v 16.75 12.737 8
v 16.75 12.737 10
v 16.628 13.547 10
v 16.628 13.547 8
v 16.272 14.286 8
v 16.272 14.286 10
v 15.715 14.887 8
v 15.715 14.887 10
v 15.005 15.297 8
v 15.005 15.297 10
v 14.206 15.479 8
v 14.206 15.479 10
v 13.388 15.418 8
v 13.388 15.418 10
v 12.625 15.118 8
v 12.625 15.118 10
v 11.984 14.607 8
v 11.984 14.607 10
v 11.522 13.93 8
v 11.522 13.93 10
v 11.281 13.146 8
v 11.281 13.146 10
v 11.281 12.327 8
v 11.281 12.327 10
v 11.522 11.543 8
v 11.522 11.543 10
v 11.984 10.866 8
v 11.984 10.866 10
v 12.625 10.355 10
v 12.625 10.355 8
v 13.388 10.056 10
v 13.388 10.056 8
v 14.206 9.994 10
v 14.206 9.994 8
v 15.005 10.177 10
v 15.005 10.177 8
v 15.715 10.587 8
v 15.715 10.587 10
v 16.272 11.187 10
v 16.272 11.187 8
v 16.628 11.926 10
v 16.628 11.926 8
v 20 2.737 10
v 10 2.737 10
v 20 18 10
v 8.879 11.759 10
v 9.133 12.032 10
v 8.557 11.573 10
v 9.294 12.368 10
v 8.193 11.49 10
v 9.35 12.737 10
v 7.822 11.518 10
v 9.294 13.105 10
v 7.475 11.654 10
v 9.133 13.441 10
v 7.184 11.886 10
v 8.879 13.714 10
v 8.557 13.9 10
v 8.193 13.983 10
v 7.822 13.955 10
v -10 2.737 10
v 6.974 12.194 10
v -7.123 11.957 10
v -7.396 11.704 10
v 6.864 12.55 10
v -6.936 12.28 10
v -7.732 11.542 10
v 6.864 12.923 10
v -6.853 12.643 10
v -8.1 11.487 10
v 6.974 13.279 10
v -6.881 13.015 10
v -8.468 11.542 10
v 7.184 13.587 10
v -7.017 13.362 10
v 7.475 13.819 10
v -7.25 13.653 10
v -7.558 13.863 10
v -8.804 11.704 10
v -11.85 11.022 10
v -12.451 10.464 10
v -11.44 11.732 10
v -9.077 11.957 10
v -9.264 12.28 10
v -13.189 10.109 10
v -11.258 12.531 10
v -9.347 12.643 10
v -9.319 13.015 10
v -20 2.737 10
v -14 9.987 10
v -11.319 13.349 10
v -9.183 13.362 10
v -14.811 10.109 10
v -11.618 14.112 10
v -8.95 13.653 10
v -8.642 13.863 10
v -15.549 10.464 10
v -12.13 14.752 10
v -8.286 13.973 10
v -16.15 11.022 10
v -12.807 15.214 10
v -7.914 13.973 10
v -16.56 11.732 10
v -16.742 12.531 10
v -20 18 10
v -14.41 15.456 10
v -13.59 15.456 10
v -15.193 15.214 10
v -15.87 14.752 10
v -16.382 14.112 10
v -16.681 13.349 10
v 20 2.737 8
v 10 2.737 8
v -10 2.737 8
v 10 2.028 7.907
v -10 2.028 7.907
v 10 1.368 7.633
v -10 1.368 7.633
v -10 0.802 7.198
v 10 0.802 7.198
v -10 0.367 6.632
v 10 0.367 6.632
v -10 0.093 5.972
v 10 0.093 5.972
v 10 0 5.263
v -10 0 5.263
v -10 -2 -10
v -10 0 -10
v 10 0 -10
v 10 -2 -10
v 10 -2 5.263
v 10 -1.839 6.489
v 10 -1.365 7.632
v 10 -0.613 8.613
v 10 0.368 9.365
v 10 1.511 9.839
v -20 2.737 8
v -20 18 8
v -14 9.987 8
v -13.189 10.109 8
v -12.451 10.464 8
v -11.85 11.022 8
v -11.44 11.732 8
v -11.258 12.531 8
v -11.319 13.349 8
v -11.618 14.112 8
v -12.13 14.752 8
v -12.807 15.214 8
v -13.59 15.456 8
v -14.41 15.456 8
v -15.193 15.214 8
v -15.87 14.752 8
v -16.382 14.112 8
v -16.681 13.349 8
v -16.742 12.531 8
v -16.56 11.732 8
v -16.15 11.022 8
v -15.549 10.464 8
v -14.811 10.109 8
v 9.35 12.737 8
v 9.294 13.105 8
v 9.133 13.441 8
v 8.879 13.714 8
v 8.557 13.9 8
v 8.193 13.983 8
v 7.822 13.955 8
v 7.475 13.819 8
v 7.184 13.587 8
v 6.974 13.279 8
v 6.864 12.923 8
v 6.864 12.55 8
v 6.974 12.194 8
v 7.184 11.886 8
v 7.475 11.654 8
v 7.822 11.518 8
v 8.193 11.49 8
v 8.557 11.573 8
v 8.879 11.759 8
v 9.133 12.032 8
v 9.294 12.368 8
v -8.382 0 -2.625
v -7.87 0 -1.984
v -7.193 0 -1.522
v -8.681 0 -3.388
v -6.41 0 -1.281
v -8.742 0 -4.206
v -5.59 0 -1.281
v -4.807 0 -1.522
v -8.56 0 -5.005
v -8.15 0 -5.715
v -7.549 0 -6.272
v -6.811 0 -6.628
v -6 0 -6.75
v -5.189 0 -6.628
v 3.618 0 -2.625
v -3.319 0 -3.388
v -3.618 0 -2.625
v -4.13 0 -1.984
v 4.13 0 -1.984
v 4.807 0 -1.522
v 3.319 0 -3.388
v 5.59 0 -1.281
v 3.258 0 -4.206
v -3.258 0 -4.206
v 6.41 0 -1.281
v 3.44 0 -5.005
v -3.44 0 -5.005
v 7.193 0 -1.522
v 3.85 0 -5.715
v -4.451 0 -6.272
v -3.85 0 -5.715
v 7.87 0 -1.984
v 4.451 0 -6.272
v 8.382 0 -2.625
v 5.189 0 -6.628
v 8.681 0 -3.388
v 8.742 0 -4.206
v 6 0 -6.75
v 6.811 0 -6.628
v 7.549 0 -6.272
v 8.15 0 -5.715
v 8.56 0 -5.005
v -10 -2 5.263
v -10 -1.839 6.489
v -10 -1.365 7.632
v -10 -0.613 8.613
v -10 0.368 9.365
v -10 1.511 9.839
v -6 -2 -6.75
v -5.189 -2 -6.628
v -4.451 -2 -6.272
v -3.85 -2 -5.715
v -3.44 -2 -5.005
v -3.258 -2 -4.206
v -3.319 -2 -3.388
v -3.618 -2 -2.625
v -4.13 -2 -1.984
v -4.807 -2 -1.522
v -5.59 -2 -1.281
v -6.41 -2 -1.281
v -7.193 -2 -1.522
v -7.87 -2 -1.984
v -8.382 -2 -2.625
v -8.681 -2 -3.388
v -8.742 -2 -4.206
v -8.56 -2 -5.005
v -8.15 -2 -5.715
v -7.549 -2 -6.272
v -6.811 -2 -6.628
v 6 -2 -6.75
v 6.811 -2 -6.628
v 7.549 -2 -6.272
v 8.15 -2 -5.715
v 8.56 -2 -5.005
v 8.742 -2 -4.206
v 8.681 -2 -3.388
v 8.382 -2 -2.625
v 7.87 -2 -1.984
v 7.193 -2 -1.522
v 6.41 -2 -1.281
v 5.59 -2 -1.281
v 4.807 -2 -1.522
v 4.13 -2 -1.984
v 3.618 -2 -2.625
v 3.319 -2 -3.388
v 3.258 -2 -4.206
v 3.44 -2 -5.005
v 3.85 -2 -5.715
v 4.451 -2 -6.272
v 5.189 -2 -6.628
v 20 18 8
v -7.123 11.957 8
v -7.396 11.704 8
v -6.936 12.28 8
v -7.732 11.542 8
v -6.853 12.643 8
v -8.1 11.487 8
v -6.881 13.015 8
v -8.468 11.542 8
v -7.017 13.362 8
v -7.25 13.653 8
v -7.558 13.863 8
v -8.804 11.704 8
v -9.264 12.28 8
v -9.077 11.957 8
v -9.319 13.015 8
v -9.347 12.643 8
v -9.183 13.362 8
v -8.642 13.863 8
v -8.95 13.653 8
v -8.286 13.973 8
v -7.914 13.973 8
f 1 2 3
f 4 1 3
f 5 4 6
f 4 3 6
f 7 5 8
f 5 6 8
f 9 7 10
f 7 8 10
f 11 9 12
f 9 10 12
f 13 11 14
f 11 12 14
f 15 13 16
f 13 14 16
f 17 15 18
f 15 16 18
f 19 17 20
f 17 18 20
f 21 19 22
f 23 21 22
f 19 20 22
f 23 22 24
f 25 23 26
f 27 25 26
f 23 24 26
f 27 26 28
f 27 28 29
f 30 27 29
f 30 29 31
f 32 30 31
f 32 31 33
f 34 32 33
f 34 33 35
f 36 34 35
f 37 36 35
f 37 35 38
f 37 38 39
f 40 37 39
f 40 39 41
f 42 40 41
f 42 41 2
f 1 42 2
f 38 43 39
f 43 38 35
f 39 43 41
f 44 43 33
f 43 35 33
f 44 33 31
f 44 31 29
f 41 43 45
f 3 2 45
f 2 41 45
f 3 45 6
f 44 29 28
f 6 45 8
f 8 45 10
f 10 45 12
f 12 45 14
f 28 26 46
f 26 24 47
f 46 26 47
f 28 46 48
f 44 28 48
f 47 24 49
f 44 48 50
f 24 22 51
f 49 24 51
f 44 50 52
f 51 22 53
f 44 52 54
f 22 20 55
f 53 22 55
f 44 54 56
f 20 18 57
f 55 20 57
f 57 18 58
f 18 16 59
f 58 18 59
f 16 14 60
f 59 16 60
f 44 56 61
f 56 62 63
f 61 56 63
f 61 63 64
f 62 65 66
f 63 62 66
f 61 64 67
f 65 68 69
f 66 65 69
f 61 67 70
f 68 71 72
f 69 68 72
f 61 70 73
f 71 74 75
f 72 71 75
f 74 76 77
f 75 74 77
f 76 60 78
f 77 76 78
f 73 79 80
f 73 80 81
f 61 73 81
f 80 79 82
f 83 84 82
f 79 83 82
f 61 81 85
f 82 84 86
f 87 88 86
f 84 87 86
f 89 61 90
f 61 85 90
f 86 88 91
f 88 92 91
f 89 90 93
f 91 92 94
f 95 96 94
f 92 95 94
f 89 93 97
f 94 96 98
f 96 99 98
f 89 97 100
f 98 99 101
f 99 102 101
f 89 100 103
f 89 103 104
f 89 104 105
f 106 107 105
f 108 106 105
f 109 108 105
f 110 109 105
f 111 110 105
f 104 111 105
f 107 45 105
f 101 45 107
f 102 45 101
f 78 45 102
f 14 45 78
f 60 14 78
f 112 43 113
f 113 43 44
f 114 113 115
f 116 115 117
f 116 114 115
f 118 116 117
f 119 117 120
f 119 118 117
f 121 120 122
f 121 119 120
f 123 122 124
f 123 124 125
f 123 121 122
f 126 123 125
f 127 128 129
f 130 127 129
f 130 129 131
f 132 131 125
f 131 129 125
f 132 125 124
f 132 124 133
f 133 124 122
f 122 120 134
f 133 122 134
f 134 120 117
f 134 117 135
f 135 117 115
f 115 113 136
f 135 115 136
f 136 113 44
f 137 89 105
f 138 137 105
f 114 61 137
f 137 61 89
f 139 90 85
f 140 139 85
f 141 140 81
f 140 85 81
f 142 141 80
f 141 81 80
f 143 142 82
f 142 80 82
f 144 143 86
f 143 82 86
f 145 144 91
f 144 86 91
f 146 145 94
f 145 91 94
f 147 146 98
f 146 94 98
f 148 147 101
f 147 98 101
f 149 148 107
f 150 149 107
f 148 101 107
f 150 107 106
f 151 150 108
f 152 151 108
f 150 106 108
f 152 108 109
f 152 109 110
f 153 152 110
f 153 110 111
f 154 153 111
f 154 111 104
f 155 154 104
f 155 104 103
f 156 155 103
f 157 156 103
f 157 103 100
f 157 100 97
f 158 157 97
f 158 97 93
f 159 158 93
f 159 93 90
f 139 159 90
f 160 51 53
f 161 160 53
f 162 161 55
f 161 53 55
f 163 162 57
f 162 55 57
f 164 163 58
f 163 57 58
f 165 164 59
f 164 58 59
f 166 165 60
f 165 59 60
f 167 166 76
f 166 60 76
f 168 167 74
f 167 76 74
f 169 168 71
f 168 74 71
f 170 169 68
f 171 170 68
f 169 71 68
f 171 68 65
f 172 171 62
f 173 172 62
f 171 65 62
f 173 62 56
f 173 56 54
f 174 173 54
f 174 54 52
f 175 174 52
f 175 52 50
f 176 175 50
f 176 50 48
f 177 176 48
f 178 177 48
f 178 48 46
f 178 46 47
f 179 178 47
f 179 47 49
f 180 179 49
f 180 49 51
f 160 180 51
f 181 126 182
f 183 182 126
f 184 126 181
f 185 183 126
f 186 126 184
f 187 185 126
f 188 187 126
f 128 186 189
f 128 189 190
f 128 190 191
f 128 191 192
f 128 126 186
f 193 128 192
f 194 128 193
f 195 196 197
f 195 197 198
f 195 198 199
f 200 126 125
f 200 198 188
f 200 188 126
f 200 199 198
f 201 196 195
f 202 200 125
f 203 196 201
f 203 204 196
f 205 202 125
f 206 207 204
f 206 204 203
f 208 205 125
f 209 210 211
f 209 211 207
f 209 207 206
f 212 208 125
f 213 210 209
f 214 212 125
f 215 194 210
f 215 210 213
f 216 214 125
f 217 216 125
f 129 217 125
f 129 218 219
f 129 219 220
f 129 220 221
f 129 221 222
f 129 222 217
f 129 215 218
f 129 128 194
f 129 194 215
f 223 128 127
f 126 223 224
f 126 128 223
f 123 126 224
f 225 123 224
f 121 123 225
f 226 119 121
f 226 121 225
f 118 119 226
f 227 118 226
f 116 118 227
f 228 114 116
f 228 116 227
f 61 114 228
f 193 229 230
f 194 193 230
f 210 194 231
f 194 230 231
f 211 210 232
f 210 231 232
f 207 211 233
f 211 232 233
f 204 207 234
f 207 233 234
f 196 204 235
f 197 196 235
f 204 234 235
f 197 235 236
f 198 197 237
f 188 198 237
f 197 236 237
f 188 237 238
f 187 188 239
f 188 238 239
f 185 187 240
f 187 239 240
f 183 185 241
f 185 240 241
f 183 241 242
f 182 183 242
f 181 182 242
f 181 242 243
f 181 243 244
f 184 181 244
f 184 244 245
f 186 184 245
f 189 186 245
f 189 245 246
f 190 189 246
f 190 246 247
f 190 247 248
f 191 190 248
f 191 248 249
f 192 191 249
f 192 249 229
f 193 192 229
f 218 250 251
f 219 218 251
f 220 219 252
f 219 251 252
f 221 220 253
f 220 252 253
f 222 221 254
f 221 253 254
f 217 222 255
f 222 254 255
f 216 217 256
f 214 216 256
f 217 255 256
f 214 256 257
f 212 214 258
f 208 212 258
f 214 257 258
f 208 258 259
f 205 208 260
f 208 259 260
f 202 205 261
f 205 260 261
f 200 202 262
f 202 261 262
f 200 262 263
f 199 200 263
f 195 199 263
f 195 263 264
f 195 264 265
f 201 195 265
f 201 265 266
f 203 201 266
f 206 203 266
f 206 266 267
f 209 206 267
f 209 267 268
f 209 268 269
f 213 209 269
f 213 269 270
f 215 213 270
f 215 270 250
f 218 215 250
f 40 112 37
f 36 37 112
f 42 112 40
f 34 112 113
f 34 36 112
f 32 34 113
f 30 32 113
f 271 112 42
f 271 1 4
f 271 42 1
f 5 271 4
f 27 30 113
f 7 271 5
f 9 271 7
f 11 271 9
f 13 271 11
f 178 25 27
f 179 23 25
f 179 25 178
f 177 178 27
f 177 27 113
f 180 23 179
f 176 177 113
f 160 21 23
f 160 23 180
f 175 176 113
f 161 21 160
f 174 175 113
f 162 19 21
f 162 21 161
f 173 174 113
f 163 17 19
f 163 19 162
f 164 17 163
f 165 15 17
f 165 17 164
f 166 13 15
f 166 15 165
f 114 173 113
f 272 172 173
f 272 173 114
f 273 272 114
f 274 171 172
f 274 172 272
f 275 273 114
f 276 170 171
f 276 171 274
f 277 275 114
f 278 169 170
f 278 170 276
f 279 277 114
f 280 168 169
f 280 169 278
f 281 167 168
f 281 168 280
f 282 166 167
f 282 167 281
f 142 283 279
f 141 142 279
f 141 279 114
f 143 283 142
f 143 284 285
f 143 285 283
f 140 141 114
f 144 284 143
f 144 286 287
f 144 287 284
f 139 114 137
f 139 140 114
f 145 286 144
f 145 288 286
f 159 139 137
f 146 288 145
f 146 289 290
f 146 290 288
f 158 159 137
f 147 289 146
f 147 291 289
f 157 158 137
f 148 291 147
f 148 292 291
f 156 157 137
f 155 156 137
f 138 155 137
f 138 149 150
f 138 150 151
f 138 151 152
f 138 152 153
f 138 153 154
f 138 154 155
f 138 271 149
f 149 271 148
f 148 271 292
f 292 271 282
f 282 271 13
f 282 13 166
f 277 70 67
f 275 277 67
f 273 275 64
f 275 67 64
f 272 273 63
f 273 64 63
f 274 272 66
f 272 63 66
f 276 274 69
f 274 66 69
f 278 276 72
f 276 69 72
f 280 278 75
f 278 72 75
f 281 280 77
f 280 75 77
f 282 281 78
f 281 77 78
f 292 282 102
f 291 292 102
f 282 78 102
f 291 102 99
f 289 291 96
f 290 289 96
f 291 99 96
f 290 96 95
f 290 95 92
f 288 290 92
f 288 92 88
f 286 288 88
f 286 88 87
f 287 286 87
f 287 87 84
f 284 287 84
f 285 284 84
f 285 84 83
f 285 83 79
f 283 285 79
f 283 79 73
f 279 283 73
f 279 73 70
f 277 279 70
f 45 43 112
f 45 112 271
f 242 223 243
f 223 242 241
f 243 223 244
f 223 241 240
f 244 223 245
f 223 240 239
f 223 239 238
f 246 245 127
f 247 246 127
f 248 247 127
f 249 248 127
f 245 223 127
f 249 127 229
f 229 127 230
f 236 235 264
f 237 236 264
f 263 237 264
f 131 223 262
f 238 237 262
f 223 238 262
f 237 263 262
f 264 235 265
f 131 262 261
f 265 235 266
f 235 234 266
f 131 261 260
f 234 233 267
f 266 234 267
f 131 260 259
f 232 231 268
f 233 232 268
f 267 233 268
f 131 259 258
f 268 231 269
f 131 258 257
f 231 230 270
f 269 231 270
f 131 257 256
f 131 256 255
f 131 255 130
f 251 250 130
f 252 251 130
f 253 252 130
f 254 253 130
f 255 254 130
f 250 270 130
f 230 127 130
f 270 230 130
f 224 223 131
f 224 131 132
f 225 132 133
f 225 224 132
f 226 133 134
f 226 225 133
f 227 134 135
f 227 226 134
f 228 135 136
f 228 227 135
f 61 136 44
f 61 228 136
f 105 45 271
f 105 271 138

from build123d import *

# Parameters (mm, degrees)
SKETCH_1_W                       = 20
SKETCH_1_H                       = 20
SM_BASE_FLANGE_1_DEPTH           = 2
SM_EDGE_FLANGE_1_STRIP_W         = 13.4732
SM_EDGE_FLANGE_1_STRIP_H         = 2
SM_EDGE_FLANGE_1_STRIP_CUT_DEPTH = 20
SM_EDGE_FLANGE_1_DEPTH           = 20
SM_EDGE_FLANGE_1_PROFILE_W       = 40
SM_EDGE_FLANGE_1_PROFILE_H       = 15.2634
SM_EDGE_FLANGE_1_FLAT_DEPTH      = 2
SKETCH_9_R                       = 2.75
SKETCH_9_R_2                     = 1.25
CUT_EXTRUDE_1_DEPTH              = 10
SKETCH_10_R                      = 2.75
CUT_EXTRUDE_2_DEPTH              = 10


# Sheet-metal steps are written as plain solids
with BuildPart() as part:
    # Sketch 1 → 基体-法兰1 (new body)
    with BuildSketch(Plane(origin=(0, 0, 0), x_dir=(1, 0, 0), z_dir=(0, 1, 0))):
        Rectangle(SKETCH_1_W, SKETCH_1_H)
    extrude(amount=-SM_BASE_FLANGE_1_DEPTH)

    # 边线-法兰1 strip (across the edge) → 边线-法兰1 strip cut (cut)
    with BuildSketch(Plane(origin=(-10, 0, 10), x_dir=(0, 0, -1), z_dir=(1, 0, 0))):
        with Locations((-2, -1)):
            Rectangle(SM_EDGE_FLANGE_1_STRIP_W, SM_EDGE_FLANGE_1_STRIP_H)
    extrude(amount=SM_EDGE_FLANGE_1_STRIP_CUT_DEPTH, mode=Mode.SUBTRACT)

    # 边线-法兰1 bend section (across the edge) → 边线-法兰1 (add)
    with BuildSketch(Plane(origin=(-10, 0, 10), x_dir=(0, 0, -1), z_dir=(1, 0, 0))):
        with BuildLine():
            Line((0, 2.7366), (2, 2.7366))
            ThreePointArc((2, 2.7366), (2.801531583, 0.801531583), (4.7366, 0))
            Line((4.7366, 0), (4.7366, -2))
            ThreePointArc((4.7366, -2), (1.38731802, -0.61268198), (0, 2.7366))
        make_face()
    extrude(amount=SM_EDGE_FLANGE_1_DEPTH)

    # 边线-法兰1 profile (on flange) → 边线-法兰1 flat (add)
    with BuildSketch(Plane(origin=(0, 0, 10), x_dir=(-1, 0, 0), z_dir=(0, 0, -1))):
        with Locations((0, 10.3683)):
            Rectangle(SM_EDGE_FLANGE_1_PROFILE_W, SM_EDGE_FLANGE_1_PROFILE_H)
    extrude(amount=SM_EDGE_FLANGE_1_FLAT_DEPTH)

    # 草图9 → 切除-拉伸1 (cut)
    with BuildSketch(Plane.XY.offset(10)):
        with Locations((14, 12.7366)):
            Circle(SKETCH_9_R)
        with Locations((8.1, 12.7366)):
            Circle(SKETCH_9_R_2)
        with Locations(Location((-8.1, 12.7366, 0), (0, 0, 270))):
            Circle(SKETCH_9_R_2)
        with Locations(Location((-14, 12.7366, 0), (0, 0, 270))):
            Circle(SKETCH_9_R)
    extrude(amount=-CUT_EXTRUDE_1_DEPTH, mode=Mode.SUBTRACT)

    # 草图10 → 切除-拉伸2 (cut)
    with BuildSketch(Plane.XZ.offset(2)):
        with Locations(Location((6, -4, 0), (0, 0, 270))):
            Circle(SKETCH_10_R)
        with Locations(Location((-6, -4, 0), (0, 0, 270))):
            Circle(SKETCH_10_R)
    extrude(amount=-CUT_EXTRUDE_2_DEPTH, mode=Mode.SUBTRACT)


solid = part.part
